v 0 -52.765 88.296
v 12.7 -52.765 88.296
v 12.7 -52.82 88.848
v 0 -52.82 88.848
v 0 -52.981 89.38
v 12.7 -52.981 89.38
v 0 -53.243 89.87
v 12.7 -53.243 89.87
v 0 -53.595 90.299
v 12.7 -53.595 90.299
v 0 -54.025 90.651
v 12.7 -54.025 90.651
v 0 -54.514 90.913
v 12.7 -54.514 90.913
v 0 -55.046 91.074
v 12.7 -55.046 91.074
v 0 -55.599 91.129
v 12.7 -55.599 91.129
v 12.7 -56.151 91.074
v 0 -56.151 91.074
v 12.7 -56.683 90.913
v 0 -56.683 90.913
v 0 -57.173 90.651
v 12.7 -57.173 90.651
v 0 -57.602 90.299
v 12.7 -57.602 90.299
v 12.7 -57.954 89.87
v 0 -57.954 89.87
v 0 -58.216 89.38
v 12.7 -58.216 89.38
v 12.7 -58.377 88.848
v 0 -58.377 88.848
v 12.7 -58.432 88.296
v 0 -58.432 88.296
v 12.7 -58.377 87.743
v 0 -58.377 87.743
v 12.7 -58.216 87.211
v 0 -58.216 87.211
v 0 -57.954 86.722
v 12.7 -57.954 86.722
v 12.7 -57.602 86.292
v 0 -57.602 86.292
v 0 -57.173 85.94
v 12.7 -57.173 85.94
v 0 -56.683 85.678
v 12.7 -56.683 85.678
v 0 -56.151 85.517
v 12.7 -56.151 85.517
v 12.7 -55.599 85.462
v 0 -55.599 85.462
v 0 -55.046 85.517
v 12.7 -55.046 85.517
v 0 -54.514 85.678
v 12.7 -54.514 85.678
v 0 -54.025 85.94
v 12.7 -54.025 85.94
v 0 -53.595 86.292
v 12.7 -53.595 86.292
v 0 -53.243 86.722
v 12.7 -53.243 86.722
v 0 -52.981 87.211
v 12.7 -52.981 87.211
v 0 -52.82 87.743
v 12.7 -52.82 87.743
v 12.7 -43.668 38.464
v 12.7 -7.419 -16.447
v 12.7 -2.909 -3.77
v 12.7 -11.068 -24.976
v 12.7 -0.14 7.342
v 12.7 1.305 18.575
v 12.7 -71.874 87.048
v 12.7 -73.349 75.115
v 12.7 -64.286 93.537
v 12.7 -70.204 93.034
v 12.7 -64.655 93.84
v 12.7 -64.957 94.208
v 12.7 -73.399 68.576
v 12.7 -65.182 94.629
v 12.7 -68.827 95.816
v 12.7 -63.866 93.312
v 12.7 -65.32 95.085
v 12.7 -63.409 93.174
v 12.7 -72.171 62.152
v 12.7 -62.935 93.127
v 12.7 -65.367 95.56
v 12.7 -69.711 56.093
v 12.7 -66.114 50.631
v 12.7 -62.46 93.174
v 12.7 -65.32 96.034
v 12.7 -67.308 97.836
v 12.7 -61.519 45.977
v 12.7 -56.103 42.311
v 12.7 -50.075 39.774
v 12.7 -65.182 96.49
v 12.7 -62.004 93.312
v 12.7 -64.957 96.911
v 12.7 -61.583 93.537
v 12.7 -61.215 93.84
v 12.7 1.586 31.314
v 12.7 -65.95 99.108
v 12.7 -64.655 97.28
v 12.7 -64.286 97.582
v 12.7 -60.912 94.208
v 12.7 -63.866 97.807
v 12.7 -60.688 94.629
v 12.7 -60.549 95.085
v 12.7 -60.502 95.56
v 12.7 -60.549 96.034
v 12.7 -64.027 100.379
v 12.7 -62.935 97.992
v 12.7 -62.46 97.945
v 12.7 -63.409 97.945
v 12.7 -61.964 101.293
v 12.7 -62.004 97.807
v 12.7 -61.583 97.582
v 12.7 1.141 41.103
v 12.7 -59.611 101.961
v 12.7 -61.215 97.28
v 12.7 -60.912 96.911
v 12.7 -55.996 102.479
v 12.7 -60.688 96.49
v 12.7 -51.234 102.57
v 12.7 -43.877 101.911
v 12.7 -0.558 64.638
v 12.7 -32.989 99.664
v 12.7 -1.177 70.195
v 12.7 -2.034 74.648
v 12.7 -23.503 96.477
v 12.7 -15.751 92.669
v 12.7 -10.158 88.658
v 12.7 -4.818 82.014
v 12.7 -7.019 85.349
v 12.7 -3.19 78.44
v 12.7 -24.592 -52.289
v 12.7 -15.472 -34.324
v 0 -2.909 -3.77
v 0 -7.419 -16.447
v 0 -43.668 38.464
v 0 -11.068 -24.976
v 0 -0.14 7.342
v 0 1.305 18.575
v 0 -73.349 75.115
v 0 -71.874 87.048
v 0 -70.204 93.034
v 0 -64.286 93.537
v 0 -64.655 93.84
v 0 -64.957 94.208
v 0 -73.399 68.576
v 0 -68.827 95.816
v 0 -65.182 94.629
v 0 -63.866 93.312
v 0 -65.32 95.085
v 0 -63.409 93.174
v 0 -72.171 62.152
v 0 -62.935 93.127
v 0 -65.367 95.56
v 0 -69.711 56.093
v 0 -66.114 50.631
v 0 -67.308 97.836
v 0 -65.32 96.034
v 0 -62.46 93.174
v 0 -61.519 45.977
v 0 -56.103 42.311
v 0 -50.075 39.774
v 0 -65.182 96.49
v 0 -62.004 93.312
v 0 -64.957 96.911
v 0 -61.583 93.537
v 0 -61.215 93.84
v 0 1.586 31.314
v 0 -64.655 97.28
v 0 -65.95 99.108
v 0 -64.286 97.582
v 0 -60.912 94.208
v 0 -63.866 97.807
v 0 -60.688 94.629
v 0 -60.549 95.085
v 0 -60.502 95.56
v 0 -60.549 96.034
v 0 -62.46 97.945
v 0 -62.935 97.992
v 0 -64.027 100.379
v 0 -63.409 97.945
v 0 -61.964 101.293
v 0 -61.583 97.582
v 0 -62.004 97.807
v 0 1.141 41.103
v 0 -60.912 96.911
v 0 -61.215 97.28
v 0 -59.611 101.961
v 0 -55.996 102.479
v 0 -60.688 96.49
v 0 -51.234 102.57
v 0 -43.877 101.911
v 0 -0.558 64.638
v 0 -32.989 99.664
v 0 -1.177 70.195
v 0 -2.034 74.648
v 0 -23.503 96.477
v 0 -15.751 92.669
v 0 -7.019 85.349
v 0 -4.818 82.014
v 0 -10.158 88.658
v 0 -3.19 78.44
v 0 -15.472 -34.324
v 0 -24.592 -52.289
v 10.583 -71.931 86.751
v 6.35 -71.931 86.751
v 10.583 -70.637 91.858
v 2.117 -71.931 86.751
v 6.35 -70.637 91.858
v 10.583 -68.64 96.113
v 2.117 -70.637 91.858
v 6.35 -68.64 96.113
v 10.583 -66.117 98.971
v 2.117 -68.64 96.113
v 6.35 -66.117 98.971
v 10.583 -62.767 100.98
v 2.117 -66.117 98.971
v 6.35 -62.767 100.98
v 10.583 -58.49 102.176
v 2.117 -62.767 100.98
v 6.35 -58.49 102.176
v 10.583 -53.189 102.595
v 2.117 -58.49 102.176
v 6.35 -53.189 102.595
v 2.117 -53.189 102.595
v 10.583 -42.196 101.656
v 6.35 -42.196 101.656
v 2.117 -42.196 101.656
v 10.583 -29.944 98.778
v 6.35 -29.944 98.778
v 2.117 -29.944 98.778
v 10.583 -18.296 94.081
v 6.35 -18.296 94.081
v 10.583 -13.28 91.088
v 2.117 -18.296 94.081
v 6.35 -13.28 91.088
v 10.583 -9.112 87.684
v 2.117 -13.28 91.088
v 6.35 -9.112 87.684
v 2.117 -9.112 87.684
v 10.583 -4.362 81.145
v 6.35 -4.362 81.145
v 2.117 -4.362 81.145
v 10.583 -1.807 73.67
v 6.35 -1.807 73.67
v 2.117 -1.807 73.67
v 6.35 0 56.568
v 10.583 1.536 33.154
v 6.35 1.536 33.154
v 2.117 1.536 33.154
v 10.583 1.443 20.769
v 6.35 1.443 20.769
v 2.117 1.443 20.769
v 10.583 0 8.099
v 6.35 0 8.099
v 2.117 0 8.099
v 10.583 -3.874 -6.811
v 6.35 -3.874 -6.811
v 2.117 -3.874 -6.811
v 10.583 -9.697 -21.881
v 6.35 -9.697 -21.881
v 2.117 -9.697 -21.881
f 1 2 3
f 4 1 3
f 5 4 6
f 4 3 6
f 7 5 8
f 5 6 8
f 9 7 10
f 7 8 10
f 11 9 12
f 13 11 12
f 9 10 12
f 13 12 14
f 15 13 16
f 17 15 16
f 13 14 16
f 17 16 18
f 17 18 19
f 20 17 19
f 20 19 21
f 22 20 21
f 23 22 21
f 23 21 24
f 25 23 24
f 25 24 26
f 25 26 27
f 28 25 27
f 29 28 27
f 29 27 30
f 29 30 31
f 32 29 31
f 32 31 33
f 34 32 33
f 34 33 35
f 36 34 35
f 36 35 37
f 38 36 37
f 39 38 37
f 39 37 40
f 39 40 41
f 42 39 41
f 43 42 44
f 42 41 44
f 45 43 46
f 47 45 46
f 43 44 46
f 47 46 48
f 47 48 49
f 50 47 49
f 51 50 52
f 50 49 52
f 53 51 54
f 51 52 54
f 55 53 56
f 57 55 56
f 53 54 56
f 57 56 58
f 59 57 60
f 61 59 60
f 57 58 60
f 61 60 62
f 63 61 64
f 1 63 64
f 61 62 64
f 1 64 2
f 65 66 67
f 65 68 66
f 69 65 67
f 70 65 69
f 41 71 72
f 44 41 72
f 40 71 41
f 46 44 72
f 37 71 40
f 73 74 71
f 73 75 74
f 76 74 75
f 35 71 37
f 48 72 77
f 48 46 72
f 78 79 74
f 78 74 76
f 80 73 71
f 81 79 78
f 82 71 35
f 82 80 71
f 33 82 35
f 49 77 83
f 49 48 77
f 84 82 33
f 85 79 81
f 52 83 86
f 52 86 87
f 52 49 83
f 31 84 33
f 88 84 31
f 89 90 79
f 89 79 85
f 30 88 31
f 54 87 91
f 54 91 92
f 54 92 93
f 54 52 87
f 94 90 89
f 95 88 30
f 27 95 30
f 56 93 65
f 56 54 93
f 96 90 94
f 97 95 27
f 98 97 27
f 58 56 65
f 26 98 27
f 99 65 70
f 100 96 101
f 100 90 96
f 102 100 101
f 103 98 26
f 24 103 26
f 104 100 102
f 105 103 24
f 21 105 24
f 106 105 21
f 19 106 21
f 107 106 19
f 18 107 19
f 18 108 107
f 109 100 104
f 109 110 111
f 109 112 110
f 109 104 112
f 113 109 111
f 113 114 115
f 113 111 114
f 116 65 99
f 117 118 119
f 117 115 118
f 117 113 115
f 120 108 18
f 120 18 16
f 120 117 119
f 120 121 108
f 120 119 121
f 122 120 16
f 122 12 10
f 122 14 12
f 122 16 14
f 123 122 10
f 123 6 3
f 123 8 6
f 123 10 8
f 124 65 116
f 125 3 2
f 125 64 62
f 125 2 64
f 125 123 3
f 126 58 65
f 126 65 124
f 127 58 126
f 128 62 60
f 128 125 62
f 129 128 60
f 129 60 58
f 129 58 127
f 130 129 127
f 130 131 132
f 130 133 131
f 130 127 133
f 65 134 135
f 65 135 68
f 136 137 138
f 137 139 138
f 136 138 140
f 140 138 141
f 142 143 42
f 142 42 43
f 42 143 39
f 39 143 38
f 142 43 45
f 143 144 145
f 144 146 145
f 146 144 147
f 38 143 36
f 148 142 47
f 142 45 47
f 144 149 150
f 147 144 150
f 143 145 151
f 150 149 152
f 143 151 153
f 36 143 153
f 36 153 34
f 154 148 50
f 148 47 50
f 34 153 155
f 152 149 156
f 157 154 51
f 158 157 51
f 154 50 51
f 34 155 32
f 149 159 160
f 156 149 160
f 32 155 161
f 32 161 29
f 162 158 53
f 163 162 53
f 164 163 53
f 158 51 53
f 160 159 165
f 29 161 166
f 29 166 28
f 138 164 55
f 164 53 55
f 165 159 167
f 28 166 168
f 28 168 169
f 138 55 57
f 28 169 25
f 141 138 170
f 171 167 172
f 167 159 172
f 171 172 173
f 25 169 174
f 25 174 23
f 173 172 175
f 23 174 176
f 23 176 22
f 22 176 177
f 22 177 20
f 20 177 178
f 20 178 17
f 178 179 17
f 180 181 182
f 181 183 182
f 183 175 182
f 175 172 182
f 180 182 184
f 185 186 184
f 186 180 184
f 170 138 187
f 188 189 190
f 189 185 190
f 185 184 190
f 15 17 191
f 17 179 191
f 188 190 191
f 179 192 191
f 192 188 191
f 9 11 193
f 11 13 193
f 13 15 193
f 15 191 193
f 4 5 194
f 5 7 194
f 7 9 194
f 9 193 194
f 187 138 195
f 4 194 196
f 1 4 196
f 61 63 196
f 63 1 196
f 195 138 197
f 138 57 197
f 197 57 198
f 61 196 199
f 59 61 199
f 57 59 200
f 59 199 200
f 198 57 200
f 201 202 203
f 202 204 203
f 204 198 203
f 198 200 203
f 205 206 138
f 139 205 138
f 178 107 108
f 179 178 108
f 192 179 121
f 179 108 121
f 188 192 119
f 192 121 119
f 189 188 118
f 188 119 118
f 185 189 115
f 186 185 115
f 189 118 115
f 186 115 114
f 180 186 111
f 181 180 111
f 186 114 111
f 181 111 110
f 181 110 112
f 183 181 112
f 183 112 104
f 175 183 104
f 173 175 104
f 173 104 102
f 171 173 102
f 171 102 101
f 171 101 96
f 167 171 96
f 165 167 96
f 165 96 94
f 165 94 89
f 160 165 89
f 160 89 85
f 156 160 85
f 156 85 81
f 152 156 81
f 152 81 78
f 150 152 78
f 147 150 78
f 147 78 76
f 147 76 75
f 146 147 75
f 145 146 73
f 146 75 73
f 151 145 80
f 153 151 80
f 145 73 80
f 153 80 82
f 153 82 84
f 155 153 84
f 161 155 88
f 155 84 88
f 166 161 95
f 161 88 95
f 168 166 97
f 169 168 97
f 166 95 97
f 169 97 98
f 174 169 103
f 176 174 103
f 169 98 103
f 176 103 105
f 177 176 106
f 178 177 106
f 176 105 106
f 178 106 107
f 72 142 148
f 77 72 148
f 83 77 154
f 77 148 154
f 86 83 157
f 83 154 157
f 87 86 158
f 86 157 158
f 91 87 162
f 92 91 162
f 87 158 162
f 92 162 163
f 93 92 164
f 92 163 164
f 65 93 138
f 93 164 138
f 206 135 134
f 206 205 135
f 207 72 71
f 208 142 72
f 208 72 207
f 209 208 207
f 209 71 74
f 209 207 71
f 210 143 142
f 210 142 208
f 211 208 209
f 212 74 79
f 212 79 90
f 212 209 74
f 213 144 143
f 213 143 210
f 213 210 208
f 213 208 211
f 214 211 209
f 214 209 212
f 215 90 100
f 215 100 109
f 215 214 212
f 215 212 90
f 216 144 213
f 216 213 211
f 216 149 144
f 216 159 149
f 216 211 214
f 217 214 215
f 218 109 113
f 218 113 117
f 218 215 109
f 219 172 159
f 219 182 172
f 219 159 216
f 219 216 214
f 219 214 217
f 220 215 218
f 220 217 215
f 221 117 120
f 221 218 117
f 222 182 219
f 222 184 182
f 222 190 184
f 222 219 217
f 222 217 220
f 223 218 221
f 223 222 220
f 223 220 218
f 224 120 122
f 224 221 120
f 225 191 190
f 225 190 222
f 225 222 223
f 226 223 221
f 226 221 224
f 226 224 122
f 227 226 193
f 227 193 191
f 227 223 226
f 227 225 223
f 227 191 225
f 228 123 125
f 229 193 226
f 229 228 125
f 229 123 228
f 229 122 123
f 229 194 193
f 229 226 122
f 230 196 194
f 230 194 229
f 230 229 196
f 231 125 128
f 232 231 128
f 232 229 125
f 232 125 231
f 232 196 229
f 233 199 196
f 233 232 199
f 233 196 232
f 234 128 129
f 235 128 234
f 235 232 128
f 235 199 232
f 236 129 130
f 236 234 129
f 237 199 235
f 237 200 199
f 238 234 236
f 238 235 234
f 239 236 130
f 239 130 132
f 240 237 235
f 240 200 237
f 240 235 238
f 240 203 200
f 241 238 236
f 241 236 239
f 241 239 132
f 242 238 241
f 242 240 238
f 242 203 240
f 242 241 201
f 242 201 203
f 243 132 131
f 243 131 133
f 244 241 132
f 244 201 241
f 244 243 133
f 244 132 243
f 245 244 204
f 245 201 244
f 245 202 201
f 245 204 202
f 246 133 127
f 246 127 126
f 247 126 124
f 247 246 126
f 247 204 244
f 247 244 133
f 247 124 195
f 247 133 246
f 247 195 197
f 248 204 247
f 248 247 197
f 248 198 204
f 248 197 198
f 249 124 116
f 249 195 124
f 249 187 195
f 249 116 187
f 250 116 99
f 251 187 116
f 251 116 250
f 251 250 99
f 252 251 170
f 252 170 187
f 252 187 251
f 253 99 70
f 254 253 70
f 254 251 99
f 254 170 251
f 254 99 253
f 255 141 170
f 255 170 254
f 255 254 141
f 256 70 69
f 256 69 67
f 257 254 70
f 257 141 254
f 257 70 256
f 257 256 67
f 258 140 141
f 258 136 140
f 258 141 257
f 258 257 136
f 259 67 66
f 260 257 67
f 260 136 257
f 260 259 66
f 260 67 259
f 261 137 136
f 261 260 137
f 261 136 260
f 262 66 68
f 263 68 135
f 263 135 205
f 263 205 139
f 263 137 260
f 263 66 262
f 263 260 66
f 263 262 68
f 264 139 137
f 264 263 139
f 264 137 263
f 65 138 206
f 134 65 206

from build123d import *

# Parameters (mm, degrees)
F1_DEPTH = 12.7
F2_R     = 2.4323517369
F3_DEPTH = 25.4
F4_R     = 2.8332069334
F5_DEPTH = 25.4


# Not quite as in the source:
# - a length typed as a fraction of an inch, garbled in the dataset ("3 / 203.2 mm" for 3/8 in), is restored


with BuildPart() as f1:
    # F0 (on Right) → F1 (new body)
    with BuildSketch(Plane.YZ):
        with BuildLine():
            ThreePointArc((-73.3486190438, 75.1153677702), (-66.1138740034, 50.6307129788), (-43.6681210995, 38.4640358388))
            Line((-43.6681210995, 38.4640358388), (-24.5922897011, -52.2894561291))
            add(Edge.make_bspline(
                [(-73.3486190438, 75.1153677702), (-72.6117781214, 83.1247650404), (-71.2247390094, 98.2017605478), (-52.9853467307, 105.9270950428), (-1.0990052853, 92.7895590782), (-0.6789523299, 55.3079359595), (5.4837017479, 5.8690932712), (-14.0842244334, -31.9697990361), (-24.5922897011, -52.2894561291)],
                knots=[0, 0, 0, 0, 0.127846329, 0.2406596231, 0.4286554949, 0.58558405, 0.7774567519, 1, 1, 1, 1], degree=3))
        make_face()
    extrude(amount=F1_DEPTH)

    # F2 (on face) → F3 (cut)
    with BuildSketch(Plane.YZ.offset(12.7)):
        with Locations((-62.9347339272, 95.5596640706)):
            Circle(F2_R)
    extrude(amount=-F3_DEPTH, mode=Mode.SUBTRACT)

    # F4 (on face) → F5 (cut)
    with BuildSketch(Plane.YZ.offset(12.7)):
        with Locations((-55.5986575782, 88.2956758142)):
            Circle(F4_R)
    extrude(amount=-F5_DEPTH, mode=Mode.SUBTRACT)


solid = f1.part
